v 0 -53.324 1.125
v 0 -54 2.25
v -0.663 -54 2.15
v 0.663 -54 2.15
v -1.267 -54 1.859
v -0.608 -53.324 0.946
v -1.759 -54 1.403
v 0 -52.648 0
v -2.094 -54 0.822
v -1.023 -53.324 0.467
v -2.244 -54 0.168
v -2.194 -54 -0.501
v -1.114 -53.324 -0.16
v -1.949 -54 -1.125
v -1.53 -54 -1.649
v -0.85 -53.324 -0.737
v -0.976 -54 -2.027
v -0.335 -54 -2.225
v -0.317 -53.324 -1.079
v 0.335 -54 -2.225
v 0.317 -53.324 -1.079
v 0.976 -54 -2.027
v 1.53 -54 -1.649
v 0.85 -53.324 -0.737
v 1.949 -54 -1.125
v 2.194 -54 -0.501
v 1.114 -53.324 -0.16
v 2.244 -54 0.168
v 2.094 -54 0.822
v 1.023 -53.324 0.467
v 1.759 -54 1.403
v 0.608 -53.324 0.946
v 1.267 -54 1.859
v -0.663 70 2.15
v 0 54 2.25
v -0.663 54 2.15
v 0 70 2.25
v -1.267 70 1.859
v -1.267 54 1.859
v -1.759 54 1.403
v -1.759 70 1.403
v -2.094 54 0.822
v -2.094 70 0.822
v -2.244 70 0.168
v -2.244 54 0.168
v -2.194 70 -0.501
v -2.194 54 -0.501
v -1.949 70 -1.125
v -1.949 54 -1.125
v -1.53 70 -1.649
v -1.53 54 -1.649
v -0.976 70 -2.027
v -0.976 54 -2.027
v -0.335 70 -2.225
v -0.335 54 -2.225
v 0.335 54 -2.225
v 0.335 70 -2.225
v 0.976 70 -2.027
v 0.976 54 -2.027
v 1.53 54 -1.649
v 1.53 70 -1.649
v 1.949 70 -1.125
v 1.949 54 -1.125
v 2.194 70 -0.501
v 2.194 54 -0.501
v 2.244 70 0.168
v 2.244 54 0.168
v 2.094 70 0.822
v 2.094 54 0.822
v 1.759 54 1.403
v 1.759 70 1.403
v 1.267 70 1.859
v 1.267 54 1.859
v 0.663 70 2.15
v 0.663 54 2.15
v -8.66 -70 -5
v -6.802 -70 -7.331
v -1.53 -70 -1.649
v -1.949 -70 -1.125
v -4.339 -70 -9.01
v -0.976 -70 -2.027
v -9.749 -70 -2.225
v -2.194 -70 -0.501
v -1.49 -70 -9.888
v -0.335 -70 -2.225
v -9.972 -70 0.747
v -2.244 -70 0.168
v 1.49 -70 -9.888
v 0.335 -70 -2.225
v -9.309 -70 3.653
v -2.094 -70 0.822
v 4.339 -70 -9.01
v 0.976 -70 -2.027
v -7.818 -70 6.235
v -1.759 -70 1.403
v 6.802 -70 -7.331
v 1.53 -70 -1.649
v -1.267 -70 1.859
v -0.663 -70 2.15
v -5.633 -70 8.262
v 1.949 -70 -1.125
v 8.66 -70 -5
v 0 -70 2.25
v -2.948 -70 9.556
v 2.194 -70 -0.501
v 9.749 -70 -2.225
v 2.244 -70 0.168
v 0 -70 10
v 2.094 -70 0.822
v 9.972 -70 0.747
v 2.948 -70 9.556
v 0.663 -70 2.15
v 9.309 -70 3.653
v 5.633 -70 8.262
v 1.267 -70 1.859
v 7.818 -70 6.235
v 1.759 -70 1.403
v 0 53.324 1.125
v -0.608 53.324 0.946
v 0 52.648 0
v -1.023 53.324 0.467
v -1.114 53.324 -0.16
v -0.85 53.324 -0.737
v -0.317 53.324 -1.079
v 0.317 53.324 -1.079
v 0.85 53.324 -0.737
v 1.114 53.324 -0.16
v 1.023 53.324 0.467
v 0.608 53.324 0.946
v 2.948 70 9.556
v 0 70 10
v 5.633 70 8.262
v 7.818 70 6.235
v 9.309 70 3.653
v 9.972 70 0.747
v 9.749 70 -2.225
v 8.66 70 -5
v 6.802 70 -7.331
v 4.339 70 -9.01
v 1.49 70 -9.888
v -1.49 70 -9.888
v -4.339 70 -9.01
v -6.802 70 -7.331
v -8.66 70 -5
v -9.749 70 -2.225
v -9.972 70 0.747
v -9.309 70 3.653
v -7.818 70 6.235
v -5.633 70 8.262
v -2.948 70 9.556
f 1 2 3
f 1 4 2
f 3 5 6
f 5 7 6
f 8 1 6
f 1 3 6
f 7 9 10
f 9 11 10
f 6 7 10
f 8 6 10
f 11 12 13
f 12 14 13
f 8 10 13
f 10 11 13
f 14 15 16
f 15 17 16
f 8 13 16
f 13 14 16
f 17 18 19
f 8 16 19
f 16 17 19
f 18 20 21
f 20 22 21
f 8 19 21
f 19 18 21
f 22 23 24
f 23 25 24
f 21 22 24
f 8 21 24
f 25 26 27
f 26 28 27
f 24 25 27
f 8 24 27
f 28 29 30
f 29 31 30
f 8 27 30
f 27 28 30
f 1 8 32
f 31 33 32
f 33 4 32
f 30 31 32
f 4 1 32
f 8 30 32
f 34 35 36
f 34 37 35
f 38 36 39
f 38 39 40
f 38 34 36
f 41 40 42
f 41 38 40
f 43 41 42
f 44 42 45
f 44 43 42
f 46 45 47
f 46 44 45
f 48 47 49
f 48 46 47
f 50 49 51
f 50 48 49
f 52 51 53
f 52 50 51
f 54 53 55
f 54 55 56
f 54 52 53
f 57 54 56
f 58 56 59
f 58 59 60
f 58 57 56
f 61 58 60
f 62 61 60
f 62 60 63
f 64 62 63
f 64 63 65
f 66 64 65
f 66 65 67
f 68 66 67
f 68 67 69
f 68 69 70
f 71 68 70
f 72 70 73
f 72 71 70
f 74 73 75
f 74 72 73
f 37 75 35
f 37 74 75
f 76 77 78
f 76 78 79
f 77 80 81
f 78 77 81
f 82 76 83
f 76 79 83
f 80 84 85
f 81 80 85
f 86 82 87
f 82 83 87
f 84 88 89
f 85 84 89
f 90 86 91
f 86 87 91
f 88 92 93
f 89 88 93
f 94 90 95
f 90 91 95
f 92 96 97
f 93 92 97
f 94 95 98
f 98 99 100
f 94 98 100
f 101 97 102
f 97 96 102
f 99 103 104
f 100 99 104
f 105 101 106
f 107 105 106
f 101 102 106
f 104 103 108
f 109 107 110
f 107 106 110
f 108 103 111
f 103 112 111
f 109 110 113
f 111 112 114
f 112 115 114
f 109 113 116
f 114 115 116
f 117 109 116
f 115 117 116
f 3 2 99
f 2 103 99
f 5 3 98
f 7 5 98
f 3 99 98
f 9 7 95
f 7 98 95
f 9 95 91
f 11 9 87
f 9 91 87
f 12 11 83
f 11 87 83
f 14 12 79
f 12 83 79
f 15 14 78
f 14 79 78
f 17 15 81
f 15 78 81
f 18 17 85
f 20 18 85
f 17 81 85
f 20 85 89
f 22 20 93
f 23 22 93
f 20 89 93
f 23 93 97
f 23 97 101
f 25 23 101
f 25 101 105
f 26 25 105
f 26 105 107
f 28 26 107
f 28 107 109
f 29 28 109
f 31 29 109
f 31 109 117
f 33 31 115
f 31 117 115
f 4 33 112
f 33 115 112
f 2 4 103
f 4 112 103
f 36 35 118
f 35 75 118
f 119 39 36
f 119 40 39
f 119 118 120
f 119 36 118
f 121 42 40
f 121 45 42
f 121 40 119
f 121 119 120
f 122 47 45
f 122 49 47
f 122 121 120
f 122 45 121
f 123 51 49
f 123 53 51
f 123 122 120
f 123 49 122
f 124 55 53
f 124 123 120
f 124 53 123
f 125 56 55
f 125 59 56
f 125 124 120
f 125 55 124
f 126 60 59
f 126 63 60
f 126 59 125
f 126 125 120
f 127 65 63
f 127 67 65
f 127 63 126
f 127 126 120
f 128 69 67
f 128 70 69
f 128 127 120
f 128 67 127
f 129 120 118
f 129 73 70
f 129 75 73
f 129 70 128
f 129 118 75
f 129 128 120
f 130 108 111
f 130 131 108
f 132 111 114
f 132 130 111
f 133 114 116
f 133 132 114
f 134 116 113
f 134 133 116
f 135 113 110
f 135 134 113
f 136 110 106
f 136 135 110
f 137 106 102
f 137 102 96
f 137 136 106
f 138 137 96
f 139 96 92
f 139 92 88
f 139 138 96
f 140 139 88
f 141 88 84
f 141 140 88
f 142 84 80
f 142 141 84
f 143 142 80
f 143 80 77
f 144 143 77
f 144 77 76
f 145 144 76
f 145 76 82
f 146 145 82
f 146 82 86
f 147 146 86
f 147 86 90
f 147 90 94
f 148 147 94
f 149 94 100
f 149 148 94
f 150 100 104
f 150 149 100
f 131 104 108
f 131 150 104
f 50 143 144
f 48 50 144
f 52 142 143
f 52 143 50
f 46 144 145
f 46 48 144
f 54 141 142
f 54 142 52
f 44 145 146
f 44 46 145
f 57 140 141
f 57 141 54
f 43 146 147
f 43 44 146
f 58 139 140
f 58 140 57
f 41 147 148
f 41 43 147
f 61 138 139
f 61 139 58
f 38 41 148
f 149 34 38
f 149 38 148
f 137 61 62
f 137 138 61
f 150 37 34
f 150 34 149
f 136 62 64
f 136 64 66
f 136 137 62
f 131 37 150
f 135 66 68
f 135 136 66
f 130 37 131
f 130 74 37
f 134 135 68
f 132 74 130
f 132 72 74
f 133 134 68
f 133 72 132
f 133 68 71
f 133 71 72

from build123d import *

# Parameters (mm, degrees)
SKETCH_1_R      = 10
EXTRUDE_1_DEPTH = 70


with BuildPart() as part:
    # Эскиз1 → Бобышка-Вытянуть1 (new body)
    with BuildSketch(Plane(origin=(0, 0, 0), x_dir=(1, 0, 0), z_dir=(0, 1, 0))):
        with Locations(Location((0, 0, 0), (0, 0, 270))):
            Circle(SKETCH_1_R)
    extrude_1 = extrude(amount=EXTRUDE_1_DEPTH)

    # Эскиз4 → Отверстие с зазором M41 (revolve, cut)
    with BuildSketch(Plane(origin=(0, 70, 0), x_dir=(0, 0, 1), z_dir=(1, 0, 0))):
        Polygon((0, 0), (0, 17.351936393), (2.25, 16), (2.25, 0), align=None)
    hole_wizard_m41 = revolve(axis=Axis((0, 76.35, 0), (0, -1, 0)), mode=Mode.SUBTRACT)

    # Зеркальное отражение1: Бобышка-Вытянуть1, Отверстие с зазором M41 across plane
    add(extrude_1.mirror(Plane.ZX))
    add(hole_wizard_m41.mirror(Plane.ZX), mode=Mode.SUBTRACT)


solid = part.part
